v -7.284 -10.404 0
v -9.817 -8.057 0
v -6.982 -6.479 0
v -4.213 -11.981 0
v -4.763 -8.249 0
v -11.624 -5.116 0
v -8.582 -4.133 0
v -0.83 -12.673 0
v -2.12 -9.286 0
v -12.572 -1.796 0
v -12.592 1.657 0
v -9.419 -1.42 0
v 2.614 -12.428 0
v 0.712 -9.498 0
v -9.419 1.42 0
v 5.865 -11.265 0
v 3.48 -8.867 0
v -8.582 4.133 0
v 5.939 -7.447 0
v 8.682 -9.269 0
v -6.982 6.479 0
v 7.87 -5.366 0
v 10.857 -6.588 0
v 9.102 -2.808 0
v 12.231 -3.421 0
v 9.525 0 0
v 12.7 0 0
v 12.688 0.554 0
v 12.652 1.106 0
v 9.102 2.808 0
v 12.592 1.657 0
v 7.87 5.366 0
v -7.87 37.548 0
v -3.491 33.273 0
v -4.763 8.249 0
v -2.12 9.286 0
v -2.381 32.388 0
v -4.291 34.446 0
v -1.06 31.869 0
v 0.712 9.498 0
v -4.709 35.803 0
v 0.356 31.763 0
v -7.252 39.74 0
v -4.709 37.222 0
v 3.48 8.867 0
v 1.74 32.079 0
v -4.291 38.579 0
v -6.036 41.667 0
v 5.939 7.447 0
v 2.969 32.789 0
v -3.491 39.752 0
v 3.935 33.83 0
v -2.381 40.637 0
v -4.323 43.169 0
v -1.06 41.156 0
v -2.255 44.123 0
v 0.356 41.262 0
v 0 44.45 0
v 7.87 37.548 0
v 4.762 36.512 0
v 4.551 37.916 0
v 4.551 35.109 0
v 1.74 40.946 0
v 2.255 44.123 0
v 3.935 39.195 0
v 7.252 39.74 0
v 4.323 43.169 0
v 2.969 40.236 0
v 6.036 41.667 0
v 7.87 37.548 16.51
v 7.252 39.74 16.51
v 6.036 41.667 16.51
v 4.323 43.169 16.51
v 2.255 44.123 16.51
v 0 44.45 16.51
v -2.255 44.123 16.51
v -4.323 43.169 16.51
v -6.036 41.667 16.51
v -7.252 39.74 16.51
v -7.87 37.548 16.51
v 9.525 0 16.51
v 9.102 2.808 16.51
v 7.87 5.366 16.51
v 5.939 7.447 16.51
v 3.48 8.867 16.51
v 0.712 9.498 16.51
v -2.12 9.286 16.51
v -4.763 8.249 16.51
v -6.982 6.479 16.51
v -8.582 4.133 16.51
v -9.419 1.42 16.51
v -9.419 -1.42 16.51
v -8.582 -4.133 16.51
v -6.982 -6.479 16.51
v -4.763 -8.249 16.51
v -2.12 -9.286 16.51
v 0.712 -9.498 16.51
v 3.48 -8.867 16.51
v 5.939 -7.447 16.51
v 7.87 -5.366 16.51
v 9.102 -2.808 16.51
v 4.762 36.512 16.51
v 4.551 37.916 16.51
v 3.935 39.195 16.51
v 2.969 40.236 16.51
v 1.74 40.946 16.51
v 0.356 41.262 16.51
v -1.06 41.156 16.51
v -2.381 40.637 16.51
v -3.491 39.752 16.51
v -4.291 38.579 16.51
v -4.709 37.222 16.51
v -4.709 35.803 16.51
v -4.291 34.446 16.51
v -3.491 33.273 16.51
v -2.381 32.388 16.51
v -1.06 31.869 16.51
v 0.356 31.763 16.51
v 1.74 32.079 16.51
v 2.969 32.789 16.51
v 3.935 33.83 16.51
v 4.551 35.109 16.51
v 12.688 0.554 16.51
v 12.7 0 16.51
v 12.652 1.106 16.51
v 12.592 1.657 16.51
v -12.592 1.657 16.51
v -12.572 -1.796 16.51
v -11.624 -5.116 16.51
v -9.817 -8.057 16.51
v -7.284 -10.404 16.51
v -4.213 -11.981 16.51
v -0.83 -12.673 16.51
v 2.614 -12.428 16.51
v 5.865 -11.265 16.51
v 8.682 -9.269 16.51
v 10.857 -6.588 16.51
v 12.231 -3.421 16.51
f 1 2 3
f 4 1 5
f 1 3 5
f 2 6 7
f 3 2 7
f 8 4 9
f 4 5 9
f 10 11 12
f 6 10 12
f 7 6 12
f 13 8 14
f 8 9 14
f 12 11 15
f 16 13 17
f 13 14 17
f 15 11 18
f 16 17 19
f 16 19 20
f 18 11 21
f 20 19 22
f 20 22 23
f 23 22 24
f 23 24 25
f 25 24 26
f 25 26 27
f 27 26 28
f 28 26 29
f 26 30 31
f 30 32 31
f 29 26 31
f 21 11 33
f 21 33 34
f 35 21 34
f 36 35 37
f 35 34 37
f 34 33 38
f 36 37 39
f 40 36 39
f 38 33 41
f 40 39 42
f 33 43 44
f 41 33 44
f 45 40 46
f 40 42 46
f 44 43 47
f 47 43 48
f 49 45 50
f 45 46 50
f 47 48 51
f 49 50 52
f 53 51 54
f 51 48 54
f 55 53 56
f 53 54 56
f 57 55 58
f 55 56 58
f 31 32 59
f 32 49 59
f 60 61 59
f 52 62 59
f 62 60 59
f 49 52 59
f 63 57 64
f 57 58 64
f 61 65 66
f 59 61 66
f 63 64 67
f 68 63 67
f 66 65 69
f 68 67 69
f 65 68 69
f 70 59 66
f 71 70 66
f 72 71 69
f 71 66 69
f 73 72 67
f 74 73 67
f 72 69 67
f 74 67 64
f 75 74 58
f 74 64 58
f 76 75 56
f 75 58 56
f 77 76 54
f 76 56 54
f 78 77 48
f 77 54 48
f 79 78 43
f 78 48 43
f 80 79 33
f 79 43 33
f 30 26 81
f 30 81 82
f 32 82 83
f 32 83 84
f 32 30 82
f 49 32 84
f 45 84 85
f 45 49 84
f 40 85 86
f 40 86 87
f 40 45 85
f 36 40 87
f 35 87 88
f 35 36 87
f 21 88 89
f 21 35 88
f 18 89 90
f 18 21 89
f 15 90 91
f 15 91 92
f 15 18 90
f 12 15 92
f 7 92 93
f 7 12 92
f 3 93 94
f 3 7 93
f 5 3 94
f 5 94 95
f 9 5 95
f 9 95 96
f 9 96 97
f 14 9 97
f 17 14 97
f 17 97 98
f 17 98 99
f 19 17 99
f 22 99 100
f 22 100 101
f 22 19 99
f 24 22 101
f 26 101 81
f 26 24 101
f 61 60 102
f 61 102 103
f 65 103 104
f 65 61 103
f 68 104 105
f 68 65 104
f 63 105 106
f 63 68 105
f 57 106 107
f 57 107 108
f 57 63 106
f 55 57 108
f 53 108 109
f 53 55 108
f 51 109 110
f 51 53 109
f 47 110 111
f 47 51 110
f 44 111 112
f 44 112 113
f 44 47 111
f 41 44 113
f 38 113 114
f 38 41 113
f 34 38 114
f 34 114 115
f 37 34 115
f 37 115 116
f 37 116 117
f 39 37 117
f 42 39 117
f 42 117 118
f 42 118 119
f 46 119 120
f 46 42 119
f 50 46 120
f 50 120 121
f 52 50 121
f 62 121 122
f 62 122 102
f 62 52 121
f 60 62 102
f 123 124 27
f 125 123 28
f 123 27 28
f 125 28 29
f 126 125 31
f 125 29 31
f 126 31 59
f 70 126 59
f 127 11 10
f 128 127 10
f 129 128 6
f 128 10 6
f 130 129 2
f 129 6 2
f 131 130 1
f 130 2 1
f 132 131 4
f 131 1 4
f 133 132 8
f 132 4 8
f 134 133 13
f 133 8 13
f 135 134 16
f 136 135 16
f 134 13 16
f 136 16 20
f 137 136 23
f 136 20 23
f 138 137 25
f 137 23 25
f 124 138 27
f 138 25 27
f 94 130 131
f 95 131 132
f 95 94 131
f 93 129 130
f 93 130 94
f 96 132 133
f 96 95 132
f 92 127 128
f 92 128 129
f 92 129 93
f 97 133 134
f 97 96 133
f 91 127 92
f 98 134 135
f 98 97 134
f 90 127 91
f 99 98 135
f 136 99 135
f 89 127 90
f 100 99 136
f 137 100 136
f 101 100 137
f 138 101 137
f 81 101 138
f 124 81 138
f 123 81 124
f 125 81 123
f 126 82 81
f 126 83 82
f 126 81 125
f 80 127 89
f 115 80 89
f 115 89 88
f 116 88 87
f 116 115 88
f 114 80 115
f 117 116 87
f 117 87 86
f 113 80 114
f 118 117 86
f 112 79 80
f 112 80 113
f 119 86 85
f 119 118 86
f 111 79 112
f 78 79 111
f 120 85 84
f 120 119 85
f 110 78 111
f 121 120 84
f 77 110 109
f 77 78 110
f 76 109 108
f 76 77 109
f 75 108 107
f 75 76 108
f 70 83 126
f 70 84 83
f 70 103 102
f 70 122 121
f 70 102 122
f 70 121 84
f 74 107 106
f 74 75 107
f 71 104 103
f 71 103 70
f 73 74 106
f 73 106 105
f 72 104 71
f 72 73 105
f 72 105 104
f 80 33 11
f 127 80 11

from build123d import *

# Parameters (mm, degrees)
F0_R     = 9.525
F0_R_2   = 4.7625
F1_DEPTH = 16.51


with BuildPart() as f1:
    # F0 (on Top) → F1 (new body)
    with BuildSketch(Plane.XY):
        with BuildLine():
            ThreePointArc((-12.591503, 1.656522), (-0.830035, -12.672847), (12.7, 0))
            ThreePointArc((12.7, 0), (12.672847, 0.830036), (12.591503, 1.656522))
            ThreePointArc((12.591503, 1.656522), (0, 12.7), (-12.591503, 1.656522))
        make_face()
        Circle(F0_R, mode=Mode.SUBTRACT)
        with BuildLine():
            ThreePointArc((-12.591503, 1.656522), (0, 12.7), (12.591503, 1.656522))
            Line((12.591503, 1.656522), (7.869689, 37.547826))
            ThreePointArc((7.869689, 37.547826), (7.920529, 37.031272), (7.9375, 36.5125))
            ThreePointArc((7.9375, 36.5125), (-0.518772, 28.591971), (-7.869689, 37.547826))
            Line((-7.869689, 37.547826), (-12.591503, 1.656522))
        make_face()
        with BuildLine():
            ThreePointArc((7.9375, 36.5125), (7.920529, 37.031272), (7.869689, 37.547826))
            ThreePointArc((7.869689, 37.547826), (0, 44.45), (-7.869689, 37.547826))
            ThreePointArc((-7.869689, 37.547826), (-0.518772, 28.591971), (7.9375, 36.5125))
        make_face()
        with Locations((0, 36.5125)):
            Circle(F0_R_2, mode=Mode.SUBTRACT)
    extrude(amount=F1_DEPTH)


solid = f1.part
